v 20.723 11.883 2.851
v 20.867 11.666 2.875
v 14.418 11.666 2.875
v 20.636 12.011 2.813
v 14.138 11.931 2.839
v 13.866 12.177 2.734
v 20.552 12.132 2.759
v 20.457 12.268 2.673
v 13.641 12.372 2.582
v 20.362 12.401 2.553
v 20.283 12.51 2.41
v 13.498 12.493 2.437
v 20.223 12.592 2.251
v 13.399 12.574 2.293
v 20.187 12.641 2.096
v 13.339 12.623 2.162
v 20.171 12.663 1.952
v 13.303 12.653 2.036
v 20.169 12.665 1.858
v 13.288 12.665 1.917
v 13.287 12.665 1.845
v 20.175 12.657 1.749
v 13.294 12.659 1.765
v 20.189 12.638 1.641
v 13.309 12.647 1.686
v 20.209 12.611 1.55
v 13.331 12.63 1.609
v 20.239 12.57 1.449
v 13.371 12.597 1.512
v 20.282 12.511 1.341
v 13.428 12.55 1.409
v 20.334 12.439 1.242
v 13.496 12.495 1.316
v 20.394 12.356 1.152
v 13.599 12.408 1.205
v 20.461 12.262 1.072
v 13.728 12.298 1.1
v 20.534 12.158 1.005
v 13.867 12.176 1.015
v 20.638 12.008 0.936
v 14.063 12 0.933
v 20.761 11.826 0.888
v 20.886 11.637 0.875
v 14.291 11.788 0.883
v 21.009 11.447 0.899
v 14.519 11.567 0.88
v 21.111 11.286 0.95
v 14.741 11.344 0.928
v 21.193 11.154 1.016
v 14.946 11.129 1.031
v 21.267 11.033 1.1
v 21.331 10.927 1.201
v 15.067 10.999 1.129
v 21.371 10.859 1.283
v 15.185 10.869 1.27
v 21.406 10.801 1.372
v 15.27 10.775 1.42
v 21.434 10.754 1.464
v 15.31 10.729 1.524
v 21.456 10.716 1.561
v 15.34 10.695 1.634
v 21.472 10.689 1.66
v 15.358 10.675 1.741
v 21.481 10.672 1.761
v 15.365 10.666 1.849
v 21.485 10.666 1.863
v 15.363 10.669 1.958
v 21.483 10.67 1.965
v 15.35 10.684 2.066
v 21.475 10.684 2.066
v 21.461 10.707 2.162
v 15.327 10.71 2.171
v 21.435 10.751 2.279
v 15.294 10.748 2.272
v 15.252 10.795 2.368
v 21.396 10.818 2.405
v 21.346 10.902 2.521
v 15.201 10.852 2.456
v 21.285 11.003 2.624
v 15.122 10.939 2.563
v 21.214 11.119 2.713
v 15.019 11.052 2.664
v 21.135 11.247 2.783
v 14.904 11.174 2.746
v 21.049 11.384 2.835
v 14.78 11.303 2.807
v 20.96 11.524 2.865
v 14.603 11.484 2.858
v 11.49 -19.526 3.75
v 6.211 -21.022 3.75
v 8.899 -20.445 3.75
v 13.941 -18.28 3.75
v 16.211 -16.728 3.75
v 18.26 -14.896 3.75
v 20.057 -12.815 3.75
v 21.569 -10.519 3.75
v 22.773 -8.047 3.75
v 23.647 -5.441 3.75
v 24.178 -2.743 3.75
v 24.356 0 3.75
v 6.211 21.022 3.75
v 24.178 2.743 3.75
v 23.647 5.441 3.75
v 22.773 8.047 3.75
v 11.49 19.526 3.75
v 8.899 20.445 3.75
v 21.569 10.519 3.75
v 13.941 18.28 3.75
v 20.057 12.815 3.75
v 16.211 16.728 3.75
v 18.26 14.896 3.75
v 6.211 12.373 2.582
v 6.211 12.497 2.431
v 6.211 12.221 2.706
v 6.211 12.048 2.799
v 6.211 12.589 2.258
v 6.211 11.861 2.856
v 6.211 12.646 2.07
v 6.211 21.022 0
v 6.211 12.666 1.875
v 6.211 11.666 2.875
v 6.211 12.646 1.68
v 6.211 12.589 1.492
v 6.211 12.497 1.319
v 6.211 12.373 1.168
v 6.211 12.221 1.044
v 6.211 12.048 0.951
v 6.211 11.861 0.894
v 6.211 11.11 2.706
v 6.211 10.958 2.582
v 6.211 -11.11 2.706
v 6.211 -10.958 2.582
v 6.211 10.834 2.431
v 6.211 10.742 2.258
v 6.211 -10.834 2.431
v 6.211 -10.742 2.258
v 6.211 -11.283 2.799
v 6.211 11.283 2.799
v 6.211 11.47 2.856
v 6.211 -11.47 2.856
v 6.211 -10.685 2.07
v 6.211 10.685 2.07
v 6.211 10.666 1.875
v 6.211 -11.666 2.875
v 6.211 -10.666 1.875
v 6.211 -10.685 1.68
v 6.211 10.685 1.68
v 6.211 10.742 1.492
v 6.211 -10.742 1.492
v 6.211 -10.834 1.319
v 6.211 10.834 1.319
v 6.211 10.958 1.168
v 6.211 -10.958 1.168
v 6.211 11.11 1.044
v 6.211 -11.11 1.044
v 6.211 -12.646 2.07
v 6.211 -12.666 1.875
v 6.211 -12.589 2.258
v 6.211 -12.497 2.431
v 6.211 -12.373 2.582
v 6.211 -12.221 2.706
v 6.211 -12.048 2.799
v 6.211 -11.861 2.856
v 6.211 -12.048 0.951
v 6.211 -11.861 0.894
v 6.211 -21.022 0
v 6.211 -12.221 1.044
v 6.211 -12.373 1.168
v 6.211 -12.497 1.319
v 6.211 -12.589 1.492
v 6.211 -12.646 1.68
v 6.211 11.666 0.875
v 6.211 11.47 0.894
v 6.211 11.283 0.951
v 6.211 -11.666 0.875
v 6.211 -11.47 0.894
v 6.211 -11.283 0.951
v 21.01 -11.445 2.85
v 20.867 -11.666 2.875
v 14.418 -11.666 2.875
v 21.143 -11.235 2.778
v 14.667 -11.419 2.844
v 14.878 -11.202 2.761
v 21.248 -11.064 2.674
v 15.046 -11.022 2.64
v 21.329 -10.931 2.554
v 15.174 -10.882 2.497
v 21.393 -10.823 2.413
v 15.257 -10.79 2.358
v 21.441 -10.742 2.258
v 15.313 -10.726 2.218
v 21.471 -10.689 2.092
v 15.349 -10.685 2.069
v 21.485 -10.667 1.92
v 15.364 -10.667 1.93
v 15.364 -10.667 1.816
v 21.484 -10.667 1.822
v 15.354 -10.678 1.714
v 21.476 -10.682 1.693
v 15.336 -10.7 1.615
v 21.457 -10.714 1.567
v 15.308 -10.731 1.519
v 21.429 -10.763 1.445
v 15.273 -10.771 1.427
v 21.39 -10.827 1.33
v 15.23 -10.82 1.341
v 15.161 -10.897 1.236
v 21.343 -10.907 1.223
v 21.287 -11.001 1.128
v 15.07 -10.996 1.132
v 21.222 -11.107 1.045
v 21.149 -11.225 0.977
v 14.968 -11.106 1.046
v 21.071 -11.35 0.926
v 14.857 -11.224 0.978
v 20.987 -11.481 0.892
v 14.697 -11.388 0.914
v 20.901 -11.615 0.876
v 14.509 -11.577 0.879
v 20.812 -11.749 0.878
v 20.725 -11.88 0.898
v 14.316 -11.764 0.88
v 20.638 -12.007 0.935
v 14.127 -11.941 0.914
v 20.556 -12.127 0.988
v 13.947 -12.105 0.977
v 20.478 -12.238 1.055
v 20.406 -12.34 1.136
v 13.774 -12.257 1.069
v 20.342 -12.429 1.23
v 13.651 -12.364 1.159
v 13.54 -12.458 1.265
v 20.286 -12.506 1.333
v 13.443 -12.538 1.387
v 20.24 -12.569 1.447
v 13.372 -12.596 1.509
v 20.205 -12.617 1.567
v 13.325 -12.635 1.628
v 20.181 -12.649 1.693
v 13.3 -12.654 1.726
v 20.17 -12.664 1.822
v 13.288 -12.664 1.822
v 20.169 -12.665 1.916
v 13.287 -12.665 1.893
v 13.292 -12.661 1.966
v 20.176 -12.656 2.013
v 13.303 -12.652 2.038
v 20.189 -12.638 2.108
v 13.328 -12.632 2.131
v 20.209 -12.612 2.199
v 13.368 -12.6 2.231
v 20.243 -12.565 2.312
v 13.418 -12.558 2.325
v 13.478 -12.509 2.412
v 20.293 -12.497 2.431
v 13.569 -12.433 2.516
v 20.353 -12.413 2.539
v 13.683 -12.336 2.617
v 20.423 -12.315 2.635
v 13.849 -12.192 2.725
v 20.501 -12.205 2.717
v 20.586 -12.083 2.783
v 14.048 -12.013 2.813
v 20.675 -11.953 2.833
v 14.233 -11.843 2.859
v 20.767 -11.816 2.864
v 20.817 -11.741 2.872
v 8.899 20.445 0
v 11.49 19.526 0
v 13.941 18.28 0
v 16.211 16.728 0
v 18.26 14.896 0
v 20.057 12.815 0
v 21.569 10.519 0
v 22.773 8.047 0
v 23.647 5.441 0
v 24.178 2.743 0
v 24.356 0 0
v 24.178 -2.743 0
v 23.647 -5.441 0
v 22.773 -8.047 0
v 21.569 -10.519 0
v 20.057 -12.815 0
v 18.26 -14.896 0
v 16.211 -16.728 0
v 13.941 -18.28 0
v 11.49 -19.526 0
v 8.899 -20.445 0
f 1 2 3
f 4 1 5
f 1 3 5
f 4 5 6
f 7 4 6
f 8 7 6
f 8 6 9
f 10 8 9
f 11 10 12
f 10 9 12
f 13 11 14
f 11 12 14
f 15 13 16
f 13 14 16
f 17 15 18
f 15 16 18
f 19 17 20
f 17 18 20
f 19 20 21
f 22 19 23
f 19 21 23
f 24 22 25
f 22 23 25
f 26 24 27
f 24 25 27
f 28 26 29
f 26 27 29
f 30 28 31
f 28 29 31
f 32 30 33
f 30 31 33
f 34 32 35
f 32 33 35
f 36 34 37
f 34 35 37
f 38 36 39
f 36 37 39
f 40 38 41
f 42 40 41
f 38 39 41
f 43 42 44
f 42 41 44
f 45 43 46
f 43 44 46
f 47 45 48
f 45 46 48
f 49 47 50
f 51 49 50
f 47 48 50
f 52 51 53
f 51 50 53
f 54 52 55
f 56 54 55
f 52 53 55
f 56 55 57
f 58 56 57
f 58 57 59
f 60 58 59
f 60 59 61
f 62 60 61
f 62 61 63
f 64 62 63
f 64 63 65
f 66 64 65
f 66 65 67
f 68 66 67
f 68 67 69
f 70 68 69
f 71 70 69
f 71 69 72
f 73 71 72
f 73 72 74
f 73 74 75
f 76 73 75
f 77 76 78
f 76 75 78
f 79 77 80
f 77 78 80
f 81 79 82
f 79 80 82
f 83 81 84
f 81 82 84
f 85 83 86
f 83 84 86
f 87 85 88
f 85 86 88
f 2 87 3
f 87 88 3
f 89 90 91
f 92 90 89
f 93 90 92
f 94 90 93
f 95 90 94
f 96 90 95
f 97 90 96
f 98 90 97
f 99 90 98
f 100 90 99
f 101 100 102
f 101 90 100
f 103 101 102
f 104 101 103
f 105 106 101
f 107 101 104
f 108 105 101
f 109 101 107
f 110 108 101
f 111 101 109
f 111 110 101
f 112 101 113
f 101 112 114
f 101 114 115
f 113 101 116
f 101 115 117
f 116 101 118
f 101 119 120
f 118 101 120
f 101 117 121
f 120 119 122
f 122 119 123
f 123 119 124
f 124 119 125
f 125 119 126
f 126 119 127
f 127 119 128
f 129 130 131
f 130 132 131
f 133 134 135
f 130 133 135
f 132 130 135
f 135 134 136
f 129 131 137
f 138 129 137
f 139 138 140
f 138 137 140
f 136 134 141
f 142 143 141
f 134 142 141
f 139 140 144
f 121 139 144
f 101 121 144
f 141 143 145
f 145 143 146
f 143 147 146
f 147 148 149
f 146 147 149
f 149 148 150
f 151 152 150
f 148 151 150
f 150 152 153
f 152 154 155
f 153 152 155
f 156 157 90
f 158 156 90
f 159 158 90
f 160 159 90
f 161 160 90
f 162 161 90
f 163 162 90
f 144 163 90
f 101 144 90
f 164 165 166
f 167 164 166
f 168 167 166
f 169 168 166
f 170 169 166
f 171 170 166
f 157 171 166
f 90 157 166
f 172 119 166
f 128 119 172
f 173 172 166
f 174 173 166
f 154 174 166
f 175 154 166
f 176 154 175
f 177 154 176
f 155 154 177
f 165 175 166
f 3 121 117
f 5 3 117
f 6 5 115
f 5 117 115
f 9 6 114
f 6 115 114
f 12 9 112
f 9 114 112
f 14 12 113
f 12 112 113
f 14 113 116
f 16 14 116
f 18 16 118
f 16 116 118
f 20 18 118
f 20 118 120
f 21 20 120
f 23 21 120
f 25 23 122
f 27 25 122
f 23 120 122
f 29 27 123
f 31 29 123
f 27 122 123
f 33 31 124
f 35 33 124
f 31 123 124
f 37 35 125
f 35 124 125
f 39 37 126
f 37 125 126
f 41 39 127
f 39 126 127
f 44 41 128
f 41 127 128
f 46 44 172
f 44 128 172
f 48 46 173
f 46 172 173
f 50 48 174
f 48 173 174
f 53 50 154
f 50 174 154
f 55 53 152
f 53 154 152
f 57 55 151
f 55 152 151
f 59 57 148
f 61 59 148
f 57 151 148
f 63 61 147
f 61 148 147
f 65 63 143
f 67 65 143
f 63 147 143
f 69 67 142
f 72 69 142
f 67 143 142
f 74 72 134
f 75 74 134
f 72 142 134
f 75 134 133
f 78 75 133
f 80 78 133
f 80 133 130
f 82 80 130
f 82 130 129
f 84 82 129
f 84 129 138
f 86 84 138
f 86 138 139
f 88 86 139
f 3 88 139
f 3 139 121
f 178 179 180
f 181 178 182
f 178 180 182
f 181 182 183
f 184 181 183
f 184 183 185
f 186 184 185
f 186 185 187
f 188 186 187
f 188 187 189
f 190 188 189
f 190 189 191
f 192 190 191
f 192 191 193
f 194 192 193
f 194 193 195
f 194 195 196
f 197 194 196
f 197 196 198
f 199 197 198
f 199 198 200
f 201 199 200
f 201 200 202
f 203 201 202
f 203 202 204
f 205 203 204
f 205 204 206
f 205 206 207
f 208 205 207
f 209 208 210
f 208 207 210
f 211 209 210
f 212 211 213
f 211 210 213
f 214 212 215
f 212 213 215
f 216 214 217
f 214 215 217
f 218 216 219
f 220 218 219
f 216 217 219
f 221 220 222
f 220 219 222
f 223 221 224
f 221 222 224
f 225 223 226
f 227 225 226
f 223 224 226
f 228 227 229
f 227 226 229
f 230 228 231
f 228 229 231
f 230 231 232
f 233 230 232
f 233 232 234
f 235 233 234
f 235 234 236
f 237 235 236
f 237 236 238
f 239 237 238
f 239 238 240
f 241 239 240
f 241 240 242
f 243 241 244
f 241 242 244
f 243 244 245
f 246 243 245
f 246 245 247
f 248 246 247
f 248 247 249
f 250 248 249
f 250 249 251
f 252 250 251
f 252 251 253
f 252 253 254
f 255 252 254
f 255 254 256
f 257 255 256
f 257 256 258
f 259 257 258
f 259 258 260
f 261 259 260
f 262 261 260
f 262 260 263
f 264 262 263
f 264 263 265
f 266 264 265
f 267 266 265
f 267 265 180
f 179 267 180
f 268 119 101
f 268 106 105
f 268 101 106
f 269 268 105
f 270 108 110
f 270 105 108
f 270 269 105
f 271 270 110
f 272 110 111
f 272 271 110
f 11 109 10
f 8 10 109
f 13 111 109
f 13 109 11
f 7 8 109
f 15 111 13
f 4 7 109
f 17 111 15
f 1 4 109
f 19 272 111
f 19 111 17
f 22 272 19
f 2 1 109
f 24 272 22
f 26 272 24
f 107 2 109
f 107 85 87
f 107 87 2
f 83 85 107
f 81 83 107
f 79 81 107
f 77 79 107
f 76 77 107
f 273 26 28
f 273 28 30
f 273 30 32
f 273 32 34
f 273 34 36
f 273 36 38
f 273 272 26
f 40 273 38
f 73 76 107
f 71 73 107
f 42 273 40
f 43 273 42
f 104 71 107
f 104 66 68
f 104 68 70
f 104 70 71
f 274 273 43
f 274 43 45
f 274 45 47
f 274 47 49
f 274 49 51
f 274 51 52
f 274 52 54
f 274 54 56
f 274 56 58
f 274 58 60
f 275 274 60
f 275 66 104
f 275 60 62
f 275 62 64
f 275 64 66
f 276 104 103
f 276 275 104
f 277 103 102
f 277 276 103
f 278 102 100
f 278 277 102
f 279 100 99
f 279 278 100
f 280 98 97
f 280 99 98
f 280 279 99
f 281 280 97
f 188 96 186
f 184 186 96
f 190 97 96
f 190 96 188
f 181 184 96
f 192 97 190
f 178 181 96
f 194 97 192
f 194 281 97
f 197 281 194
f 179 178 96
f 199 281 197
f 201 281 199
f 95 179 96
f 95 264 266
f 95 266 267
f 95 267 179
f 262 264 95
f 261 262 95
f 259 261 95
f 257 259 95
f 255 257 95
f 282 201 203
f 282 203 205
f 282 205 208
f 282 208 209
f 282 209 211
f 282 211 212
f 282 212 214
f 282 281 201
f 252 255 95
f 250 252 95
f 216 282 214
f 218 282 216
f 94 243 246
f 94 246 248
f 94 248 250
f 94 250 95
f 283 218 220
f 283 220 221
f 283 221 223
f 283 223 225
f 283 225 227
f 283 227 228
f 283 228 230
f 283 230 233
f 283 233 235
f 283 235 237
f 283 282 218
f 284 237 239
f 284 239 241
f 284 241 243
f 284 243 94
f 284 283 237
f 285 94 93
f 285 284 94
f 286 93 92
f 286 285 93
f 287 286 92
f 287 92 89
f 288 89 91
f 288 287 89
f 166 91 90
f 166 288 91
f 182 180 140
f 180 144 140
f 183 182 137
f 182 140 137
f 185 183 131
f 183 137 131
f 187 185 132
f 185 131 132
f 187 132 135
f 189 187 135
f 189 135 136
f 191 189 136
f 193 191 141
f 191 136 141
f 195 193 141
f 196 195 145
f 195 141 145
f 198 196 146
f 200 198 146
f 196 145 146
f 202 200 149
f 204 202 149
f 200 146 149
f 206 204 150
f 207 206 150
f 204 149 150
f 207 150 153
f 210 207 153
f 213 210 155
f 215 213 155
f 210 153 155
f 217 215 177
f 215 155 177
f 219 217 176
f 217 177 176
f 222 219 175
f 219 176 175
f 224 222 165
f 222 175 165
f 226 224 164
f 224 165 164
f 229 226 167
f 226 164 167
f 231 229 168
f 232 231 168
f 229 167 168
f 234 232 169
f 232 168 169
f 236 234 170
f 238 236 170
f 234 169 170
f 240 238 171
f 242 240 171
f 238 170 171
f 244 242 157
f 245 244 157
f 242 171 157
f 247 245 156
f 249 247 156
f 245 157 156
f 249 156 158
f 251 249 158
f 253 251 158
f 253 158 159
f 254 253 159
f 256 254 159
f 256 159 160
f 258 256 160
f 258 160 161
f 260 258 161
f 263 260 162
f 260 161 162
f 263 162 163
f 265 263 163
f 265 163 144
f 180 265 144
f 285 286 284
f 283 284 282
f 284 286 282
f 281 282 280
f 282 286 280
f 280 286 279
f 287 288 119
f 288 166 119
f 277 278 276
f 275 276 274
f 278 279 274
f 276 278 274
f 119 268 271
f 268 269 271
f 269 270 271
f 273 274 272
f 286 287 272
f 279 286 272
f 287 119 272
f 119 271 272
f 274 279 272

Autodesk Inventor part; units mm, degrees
ref_plane "YZ Plane" through (0, 0, 0) normal (1, 0, 0) x (0, 1, 0)
ref_plane "XZ Plane" through (0, 0, 0) normal (0, 1, 0) x (-1, 0, 0)
ref_plane "XY Plane" through (0, 0, 0) normal (0, 0, 1) x (1, 0, 0)
sketch "Sketch3" plane through (0, 0, 0) normal (0, 0, 1) x (1, 0, 0)
  arc A0 (6.2115, -31.9009) -> (6.2115, 31.9009) centre (0, 0) ccw
  line L0 (6.2115, 27.4733) -> (6.2115, 31.9009)
  line L1 (6.2115, 31.9009) -> (6.2115, -31.9009)
  circle A1 centre (0, 0) radius 42.5
  line L2 (6.2115, -31.9009) -> (6.2115, -42.0436)
  line L3 (6.2115, 31.9009) -> (6.2115, 42.0436)
  point P0 (-5.2115, 24.6247)
  dimension "d14" = 85
extrude "Extrusion2" add sketch "Sketch3" along normal blind 7.5 contours L1 L0 A0
sketch "Sketch4" plane through (6.2115, -31.9009, 0) normal (-1, 0, 0) x (0, 0, 1)
  line L0 (0, 0) -> (0, 6.9167)
  line L1 (7.5, 26.7893) -> (7.5, 0)
  line L2 (7.5, 6.9167) -> (7.5, 0)
  line L3 (7.5, 0) -> (0, 0)
  line L4 (7.5, 0) -> (0, 0)
  circle A0 centre (3.75, 8.5699) radius 1
  line L5 (0, 0) -> (3.0149, 2.7804)
  line L6 (4.4851, 4.1363) -> (7.5, 6.9167)
  line L7 (0, 6.9167) -> (3.0149, 4.1363)
  line L8 (4.4851, 2.7804) -> (7.5, 0)
  line L9 (0, 0) -> (0, 53.5786)
  line L10 (0, 53.5786) -> (0, 0)
  line L11 (0, 31.9009) -> (7.5, 31.9009)
  circle A1 centre (3.75, 55.2319) radius 1
  line L12 (7.5, 53.5786) -> (7.5, 0)
  line L13 (0, 0) -> (0, 63.8018) projected
  line L14 (0, 63.8018) -> (0, 0)
  line L15 (0, 31.9009) -> (3.75, 31.9009)
  circle A2 centre (3.75, 8.5699) radius 2
  circle A3 centre (3.75, 55.2319) radius 2
  point P0 (280.32, 51.414)
  dimension "d7" = 2
  dimension "d10" = 4
  dimension "d11" = 4
extrude "Extrusion3" cut sketch "Sketch4" against normal blind 25.4 contours A0 | A1
extrude "Extrusion4" cut sketch "Sketch4" against normal blind 32.8625 contours A2 | A3
extrude "Extrusion5" add sketch "Sketch3" along normal blind 7.5 contours A0 L3 A1 L2
extrude "Extrusion6" cut sketch "Sketch4" against normal blind 50.3625 contours A0 | A1 | A2 | A3
scale "Scale1" factors (0.5, 0.5, 0.5) then translate (3.1057, 0, 0) bodies 1
properties part number "ContrapesoGrande"
